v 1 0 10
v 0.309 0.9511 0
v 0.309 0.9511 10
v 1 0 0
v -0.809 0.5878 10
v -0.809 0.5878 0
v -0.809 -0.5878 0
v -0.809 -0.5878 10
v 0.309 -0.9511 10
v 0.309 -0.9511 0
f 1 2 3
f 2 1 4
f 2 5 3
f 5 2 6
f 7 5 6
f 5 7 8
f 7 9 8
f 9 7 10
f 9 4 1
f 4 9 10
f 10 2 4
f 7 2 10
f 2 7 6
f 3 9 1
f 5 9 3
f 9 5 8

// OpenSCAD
// Unit of length: Unit.MM
cylinder(h = 10.0, d = 2.0, center = false);
